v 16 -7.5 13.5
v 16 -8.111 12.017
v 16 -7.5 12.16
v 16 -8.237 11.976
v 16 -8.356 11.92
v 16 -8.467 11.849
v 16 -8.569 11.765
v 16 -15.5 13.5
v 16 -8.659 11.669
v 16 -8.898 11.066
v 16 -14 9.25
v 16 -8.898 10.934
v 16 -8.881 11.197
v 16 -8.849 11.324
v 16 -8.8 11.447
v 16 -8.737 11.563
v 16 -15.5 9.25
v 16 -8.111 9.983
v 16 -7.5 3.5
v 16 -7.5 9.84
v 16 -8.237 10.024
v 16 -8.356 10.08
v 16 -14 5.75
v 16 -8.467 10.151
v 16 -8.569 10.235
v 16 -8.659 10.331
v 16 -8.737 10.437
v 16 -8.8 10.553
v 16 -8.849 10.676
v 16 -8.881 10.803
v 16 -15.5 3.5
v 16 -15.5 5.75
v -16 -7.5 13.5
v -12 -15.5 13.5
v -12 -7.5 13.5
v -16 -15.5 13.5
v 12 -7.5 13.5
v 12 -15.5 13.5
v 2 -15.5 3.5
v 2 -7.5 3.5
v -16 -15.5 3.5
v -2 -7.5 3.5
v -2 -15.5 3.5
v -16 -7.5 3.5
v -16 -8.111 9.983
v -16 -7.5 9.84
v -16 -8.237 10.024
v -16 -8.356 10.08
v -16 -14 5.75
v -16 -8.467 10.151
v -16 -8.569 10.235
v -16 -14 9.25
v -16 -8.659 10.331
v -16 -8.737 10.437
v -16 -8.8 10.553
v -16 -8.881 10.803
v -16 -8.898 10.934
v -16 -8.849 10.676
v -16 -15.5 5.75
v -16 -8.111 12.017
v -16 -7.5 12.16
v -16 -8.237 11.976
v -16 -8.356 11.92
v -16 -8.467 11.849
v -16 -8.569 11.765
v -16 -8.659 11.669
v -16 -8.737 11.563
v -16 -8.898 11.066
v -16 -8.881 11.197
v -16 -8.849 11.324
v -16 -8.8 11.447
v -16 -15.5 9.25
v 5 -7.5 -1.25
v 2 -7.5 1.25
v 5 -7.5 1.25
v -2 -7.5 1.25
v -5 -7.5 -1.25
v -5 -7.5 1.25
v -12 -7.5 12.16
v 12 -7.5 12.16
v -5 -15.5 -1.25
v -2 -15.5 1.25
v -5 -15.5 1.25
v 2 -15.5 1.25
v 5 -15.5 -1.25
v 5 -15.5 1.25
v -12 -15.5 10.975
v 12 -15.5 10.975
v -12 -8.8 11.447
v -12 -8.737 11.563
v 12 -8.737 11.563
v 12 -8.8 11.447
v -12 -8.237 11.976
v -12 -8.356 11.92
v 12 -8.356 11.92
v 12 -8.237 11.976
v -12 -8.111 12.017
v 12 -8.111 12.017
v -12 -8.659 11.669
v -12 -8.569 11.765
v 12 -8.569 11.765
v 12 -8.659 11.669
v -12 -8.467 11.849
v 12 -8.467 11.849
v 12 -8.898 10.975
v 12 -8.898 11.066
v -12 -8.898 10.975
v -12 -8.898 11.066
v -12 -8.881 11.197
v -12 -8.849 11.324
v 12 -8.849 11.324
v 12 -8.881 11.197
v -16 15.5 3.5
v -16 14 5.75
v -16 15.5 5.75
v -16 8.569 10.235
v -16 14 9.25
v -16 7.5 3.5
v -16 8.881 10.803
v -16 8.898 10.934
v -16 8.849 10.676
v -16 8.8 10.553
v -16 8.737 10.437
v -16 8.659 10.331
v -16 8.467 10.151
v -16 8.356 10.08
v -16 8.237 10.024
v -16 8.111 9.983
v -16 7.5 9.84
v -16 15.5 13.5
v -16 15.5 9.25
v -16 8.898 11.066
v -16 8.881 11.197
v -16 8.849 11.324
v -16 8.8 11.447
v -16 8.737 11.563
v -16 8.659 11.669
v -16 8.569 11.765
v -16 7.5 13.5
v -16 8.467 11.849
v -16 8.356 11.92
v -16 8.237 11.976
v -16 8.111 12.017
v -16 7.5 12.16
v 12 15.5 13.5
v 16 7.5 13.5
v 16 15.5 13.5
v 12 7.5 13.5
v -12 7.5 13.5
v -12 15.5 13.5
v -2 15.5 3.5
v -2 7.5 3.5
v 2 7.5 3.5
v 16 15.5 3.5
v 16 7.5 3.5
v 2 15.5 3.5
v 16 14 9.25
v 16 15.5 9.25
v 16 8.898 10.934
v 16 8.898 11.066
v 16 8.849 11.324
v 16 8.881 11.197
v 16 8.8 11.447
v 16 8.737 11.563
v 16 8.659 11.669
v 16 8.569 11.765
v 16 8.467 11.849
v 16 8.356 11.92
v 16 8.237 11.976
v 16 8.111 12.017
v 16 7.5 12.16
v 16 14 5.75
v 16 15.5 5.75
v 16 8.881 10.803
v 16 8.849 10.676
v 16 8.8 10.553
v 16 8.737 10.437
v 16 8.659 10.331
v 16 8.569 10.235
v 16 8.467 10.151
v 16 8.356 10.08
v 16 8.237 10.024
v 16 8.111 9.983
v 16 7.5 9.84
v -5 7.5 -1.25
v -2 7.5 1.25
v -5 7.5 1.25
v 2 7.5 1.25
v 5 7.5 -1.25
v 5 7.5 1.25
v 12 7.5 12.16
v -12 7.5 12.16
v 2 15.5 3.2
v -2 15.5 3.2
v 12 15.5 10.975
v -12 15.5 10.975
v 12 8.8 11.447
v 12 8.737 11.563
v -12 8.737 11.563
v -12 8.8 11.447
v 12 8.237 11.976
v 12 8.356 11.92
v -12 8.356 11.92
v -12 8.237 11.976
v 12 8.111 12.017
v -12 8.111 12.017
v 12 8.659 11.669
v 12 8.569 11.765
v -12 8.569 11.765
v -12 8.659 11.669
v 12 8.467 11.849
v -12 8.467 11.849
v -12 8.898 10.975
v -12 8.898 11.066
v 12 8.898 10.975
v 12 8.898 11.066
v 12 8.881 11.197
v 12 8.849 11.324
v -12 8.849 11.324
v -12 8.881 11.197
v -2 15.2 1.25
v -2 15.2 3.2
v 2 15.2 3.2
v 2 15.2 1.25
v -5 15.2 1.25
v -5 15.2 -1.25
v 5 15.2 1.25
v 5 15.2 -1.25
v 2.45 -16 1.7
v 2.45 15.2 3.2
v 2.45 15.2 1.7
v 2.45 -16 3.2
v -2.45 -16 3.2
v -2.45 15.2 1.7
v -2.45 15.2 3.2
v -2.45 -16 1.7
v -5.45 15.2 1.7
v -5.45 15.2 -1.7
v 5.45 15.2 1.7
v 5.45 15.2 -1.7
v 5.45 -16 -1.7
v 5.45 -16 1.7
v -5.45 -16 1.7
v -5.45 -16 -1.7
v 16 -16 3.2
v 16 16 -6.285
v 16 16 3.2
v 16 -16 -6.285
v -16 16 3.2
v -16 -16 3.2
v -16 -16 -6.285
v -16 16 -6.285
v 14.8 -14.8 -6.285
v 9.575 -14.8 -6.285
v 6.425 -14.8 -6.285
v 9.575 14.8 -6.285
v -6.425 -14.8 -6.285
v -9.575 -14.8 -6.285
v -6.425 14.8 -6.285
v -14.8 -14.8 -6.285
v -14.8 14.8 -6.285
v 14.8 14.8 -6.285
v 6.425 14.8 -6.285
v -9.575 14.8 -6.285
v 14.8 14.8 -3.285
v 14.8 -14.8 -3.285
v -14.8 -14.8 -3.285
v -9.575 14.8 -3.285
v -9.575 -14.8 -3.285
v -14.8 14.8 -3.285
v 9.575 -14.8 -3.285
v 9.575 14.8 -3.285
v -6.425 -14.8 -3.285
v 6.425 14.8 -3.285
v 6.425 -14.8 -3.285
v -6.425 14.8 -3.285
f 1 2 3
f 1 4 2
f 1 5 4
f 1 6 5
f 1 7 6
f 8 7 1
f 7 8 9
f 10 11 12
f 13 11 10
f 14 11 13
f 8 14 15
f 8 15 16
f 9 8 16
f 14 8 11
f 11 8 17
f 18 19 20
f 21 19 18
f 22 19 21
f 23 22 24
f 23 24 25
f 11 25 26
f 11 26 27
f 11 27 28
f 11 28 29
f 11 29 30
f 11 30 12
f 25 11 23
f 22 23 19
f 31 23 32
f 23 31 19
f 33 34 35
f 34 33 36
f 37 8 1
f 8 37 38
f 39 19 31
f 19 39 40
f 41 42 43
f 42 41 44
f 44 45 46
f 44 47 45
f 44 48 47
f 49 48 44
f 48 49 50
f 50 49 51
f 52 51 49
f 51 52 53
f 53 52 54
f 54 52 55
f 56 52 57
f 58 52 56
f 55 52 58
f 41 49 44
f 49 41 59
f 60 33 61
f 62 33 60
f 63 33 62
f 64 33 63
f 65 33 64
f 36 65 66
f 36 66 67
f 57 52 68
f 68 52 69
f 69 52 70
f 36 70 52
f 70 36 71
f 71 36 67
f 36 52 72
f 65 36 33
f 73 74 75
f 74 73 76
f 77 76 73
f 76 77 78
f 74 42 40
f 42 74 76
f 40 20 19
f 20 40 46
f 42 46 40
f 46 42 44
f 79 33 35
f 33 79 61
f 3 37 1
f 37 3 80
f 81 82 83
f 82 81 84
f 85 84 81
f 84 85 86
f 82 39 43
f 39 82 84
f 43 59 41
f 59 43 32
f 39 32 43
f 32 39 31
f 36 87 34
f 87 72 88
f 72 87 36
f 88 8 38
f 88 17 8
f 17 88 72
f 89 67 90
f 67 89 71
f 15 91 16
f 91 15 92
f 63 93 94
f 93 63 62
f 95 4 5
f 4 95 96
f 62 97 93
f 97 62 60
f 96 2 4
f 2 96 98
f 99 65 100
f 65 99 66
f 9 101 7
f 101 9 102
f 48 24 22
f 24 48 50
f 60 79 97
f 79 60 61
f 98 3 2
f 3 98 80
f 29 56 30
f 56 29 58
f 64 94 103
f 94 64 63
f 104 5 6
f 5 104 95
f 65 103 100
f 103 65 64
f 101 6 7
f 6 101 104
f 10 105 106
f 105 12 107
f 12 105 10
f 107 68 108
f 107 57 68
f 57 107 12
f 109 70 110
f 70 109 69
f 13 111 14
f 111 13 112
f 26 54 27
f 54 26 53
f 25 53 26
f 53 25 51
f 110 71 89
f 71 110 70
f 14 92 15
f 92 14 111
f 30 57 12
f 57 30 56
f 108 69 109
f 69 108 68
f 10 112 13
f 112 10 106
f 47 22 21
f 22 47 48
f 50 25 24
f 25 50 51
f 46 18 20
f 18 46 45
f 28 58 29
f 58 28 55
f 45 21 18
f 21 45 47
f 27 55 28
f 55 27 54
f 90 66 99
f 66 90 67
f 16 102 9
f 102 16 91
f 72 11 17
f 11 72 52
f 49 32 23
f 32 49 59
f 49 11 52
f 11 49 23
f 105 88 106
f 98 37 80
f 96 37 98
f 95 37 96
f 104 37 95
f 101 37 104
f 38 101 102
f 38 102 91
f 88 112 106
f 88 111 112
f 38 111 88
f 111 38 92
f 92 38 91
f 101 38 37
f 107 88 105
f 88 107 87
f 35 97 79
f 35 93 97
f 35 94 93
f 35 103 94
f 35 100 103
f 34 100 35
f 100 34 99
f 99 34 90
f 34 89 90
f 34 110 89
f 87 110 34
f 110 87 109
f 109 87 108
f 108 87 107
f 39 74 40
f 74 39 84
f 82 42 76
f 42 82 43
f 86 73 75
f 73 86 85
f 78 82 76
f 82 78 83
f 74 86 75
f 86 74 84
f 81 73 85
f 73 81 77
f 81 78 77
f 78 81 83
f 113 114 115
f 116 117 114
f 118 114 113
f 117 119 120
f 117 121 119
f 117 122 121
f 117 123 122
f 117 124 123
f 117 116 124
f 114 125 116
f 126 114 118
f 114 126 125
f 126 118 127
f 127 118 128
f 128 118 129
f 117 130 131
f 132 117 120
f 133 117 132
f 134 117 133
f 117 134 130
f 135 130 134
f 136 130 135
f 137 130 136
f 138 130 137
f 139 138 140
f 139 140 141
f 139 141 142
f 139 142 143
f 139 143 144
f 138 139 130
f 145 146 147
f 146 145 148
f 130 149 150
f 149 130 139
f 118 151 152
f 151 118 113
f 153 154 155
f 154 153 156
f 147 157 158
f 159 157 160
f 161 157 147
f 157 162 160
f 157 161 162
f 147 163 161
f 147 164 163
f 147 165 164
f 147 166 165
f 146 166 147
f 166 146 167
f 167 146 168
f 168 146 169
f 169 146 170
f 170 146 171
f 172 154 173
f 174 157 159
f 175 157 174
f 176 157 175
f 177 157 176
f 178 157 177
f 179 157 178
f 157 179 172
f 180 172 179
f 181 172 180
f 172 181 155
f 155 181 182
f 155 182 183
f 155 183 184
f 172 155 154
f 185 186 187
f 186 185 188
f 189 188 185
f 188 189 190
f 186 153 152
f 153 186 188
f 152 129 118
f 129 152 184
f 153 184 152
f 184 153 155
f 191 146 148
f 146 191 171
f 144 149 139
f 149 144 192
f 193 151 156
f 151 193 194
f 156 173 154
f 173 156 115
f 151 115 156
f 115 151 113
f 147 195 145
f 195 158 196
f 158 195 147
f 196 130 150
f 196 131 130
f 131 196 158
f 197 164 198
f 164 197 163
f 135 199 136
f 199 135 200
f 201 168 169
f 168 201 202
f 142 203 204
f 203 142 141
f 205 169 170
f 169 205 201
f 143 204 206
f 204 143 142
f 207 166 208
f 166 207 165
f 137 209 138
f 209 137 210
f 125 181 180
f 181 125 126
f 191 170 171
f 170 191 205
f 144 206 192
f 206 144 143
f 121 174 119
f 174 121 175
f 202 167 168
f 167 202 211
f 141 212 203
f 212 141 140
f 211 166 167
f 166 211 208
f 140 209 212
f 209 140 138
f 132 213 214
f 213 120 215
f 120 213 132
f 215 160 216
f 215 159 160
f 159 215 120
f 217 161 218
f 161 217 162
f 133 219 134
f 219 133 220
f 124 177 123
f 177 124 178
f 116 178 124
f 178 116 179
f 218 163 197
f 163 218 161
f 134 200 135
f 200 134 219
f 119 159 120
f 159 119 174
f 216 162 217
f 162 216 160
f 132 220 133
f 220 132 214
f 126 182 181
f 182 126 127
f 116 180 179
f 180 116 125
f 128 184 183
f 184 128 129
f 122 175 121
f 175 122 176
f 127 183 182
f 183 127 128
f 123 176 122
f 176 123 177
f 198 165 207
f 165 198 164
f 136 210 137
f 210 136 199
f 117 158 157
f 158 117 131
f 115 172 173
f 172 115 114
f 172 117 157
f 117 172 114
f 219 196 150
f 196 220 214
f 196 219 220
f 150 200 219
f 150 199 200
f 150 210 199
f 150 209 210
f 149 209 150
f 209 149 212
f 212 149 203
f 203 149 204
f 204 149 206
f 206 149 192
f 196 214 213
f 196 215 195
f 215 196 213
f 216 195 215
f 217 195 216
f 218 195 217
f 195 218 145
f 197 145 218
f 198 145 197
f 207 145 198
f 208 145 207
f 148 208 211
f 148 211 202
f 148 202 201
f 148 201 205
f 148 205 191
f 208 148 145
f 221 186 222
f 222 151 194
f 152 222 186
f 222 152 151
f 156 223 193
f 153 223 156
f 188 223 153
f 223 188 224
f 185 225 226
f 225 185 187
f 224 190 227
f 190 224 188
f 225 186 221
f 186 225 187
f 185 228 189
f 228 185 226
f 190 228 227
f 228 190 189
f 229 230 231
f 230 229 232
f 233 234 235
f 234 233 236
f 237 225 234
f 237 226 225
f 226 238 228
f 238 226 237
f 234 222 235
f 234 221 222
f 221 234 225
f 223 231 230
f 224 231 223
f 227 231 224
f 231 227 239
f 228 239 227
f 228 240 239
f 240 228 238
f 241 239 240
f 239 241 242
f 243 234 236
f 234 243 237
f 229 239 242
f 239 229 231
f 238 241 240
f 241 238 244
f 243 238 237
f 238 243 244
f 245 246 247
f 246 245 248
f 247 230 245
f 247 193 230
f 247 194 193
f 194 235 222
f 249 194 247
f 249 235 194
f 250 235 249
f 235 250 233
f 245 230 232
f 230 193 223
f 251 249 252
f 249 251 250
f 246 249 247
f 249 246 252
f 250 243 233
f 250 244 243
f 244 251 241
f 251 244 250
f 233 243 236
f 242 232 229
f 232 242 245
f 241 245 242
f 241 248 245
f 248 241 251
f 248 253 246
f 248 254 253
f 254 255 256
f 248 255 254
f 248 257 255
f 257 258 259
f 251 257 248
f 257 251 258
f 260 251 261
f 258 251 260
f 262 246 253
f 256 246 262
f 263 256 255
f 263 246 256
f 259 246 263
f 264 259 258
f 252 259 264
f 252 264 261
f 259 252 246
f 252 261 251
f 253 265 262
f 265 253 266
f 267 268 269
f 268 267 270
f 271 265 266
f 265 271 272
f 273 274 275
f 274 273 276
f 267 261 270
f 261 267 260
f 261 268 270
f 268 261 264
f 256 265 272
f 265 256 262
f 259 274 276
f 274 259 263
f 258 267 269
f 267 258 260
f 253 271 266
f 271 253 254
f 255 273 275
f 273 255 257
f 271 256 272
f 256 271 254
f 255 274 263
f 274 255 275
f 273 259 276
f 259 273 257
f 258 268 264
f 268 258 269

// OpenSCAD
/*
 * Component Holder.scad
 *
 *
 * NOTES:
 *
 * There are two different parts, the Track (with LEGO compatible fittings
 * on the bottom) and the Jaws which slide in the groove of the track and 
 * are held tight using a rubber band.
 *
 * You will need to print one track and two jaws.
 *
 * The track should be printed standing on end, and the jaws should be 
 * printed face down (with the curved PCB groove) on the bed.
 *
 * INSTRUCTIONS:
 *
 * 1. In the RENDER section set beautyRender to 1 and the rest to 0
 * 
 * 2. In SETTINGS set componentX and componentY to the size of the 
 *    PCB of the component you will be using.
 *
 * 3. In SETTINGS adjust brickX and brickY to be sized appropriately 
 *    to fit the component you added in the first step.
 * 
 * 4. If needed, change slotWidth to a number above 0 to accommodate 
 *    elements that may need clearance on the jaws.
 * 
 * 5. In the RENDER section set only trackRender to 1 and then export
 *    that, and then do the same for jawRender.
 *
 * 
 * Pete Prodoehl <pete@browndoggadgets.com>
 *
 */


/* --- SETTIINGS ---------------------------------------------------------------------------- */

// set the size of the component
componentX = 30;
componentY = 15;

// adjust for the size you need to hold the component
brickX = 4;
brickY = 4;

// do not change these values
trackWidth  = brickX * 8;   // do not change
trackLength = brickY * 8;   // do not change
trackHeight = 5.5;          // do not change
trackMidX   = 4;            // do not change
trackMidZ   = 5;            // do not change
trackBotX   = 10;           // do not change
trackBotZ   = 2.5;          // do not change

// adjust if desired to change the width of the jaws
jawWidth = trackWidth;

// adjusting only affects preview of jaws if needed
jawPreviewSpace = 4.5;  // default to 4.5

// add a slot in the jaw for some components if needed
slotWidth = 24; // set to 0 for no slot

$fn=50;


/* --- RENDER ------------------------------------------------------------------------------- */


// toggle these to affect the preview and rendering
trackRender  = 0;
jawRender    = 0;
beautyRender = 1;



// render commands
if (jawRender) {
	translate([0,0,0/2]) jawPart();
}
if (trackRender) {
	translate([0,0,0/2]) trackPart();
}
if (beautyRender) {
	translate([0,-trackLength/2+jawPreviewSpace,0]) rotate([0,0,0])   color("#0066FF") jawPart();
	translate([0,+trackLength/2-jawPreviewSpace,0]) rotate([0,0,180]) color("#0066FF") jawPart();
	translate([0,0,0]) color("#99AA00") trackPart();
	%translate([0,0,11]) cube([componentX,componentY,1.6], center=true); // component size here
}



/* --- MODULES ------------------------------------------------------------------------------ */

// jawPart is the jaws which hold the component...
//
module jawPart() {

    difference() {
        
        // top of jaw with PCB and rubber band slot cutouts
        translate([0,0,8.5])
            cube([jawWidth,8,10], center=true);
            
        // PCB slot
        hull() {
        
            translate([0,4.75,11])
                rotate([0,90,0])
                    cylinder(d=2.6, h=jawWidth+0.01, center=true);

            translate([0,3.65,11])
                rotate([0,90,0])
                    cylinder(d=2.1, h=jawWidth+0.01, center=true);                
                
        }
            
        // rubber band slot
        translate([0,-4.5,7.5])
            cube([jawWidth+0.01,4,3.5], center=true);
            
        // slot if included
        translate([0,0,13.85])
            cube([slotWidth,10,5.75], center=true);
      
    }

	// inverted T at the bottom of the jaw
    translate([0,0,0])
        guidePart();

}

/* ------------------------------------------------------------------------------------------ */

// trackPart is the basic track sized as specified
// with the guideSlot cut out from it...
//
module trackPart() {
    
    difference() {

        translate([0,0,-trackHeight/2+3.2])
            cube([trackWidth,trackLength,trackHeight], center=true);
            
        translate([0,-0.8,0])
           guideSlot();

    }
    
    // LEGO compatible bottom portion
    translate([0,0,-4.285])
        Lego_Maker(brickY, brickX);
	
} // end trackPart

/* ------------------------------------------------------------------------------------------ */

// guidePart is the inverted T at the bottom of the jaw that fits into the slot/groove
// in the trackPart which gets created by cutting out the guideSlot...
//
module guidePart() {

    variance = 0;
    trackLength = 8; 

    // middle
    translate([0,0,3])
        color("#00FF33")
            cube([trackMidX+variance,trackLength,trackMidZ+variance], center=true);
    
    // bottom
    translate([0,0,0])
        color("#33AA66")
            cube([trackBotX+variance,trackLength,trackBotZ+variance], center=true);
        
}  // end guidePart

/* ------------------------------------------------------------------------------------------ */

// guideSlot is the cutout part from the trackPart which creates the slot/groove 
// that the guidePart fits into and slides in...
//
module guideSlot() {
    
    variance = 0.9;
    
    // middle
    translate([0,0,3])
        color("#996600")
            cube([trackMidX+variance,trackLength,trackMidZ+variance], center=true);
            
    // bottom
    translate([0,0,0])
        color("#999900")
            cube([trackBotX+variance,trackLength,trackBotZ+variance], center=true);
        
}  // end guideSlot

/* ------------------------------------------------------------------------------------------ */

// Lego_Maker creates the modified LEGO brick-like part at the bottom of the holder...
//
module Lego_Maker(width, length) {

	unit_height   = 4;    // height of main brick
	unit_width    = 8;    // width of one LEGO Unit
    wall_width_x2 = 3.15; // double wall width
    
    difference() {
    
        translate([0,0,0])
            cube([length*unit_width, width*unit_width, unit_height], center=true);
    
        translate([0,0,-1])
            cube([length*unit_width-2.4, width*unit_width-2.4, unit_height], center=true);

    }
    
    translate([trackWidth/2-unit_width,0,0])
        cube([wall_width_x2, width*unit_width, unit_height], center=true);
        
    translate([-trackWidth/2+unit_width,0,0])
        cube([wall_width_x2, width*unit_width, unit_height], center=true);

}  // end Lego_Maker

/* ------------------------------------------------------------------------------------------ */
